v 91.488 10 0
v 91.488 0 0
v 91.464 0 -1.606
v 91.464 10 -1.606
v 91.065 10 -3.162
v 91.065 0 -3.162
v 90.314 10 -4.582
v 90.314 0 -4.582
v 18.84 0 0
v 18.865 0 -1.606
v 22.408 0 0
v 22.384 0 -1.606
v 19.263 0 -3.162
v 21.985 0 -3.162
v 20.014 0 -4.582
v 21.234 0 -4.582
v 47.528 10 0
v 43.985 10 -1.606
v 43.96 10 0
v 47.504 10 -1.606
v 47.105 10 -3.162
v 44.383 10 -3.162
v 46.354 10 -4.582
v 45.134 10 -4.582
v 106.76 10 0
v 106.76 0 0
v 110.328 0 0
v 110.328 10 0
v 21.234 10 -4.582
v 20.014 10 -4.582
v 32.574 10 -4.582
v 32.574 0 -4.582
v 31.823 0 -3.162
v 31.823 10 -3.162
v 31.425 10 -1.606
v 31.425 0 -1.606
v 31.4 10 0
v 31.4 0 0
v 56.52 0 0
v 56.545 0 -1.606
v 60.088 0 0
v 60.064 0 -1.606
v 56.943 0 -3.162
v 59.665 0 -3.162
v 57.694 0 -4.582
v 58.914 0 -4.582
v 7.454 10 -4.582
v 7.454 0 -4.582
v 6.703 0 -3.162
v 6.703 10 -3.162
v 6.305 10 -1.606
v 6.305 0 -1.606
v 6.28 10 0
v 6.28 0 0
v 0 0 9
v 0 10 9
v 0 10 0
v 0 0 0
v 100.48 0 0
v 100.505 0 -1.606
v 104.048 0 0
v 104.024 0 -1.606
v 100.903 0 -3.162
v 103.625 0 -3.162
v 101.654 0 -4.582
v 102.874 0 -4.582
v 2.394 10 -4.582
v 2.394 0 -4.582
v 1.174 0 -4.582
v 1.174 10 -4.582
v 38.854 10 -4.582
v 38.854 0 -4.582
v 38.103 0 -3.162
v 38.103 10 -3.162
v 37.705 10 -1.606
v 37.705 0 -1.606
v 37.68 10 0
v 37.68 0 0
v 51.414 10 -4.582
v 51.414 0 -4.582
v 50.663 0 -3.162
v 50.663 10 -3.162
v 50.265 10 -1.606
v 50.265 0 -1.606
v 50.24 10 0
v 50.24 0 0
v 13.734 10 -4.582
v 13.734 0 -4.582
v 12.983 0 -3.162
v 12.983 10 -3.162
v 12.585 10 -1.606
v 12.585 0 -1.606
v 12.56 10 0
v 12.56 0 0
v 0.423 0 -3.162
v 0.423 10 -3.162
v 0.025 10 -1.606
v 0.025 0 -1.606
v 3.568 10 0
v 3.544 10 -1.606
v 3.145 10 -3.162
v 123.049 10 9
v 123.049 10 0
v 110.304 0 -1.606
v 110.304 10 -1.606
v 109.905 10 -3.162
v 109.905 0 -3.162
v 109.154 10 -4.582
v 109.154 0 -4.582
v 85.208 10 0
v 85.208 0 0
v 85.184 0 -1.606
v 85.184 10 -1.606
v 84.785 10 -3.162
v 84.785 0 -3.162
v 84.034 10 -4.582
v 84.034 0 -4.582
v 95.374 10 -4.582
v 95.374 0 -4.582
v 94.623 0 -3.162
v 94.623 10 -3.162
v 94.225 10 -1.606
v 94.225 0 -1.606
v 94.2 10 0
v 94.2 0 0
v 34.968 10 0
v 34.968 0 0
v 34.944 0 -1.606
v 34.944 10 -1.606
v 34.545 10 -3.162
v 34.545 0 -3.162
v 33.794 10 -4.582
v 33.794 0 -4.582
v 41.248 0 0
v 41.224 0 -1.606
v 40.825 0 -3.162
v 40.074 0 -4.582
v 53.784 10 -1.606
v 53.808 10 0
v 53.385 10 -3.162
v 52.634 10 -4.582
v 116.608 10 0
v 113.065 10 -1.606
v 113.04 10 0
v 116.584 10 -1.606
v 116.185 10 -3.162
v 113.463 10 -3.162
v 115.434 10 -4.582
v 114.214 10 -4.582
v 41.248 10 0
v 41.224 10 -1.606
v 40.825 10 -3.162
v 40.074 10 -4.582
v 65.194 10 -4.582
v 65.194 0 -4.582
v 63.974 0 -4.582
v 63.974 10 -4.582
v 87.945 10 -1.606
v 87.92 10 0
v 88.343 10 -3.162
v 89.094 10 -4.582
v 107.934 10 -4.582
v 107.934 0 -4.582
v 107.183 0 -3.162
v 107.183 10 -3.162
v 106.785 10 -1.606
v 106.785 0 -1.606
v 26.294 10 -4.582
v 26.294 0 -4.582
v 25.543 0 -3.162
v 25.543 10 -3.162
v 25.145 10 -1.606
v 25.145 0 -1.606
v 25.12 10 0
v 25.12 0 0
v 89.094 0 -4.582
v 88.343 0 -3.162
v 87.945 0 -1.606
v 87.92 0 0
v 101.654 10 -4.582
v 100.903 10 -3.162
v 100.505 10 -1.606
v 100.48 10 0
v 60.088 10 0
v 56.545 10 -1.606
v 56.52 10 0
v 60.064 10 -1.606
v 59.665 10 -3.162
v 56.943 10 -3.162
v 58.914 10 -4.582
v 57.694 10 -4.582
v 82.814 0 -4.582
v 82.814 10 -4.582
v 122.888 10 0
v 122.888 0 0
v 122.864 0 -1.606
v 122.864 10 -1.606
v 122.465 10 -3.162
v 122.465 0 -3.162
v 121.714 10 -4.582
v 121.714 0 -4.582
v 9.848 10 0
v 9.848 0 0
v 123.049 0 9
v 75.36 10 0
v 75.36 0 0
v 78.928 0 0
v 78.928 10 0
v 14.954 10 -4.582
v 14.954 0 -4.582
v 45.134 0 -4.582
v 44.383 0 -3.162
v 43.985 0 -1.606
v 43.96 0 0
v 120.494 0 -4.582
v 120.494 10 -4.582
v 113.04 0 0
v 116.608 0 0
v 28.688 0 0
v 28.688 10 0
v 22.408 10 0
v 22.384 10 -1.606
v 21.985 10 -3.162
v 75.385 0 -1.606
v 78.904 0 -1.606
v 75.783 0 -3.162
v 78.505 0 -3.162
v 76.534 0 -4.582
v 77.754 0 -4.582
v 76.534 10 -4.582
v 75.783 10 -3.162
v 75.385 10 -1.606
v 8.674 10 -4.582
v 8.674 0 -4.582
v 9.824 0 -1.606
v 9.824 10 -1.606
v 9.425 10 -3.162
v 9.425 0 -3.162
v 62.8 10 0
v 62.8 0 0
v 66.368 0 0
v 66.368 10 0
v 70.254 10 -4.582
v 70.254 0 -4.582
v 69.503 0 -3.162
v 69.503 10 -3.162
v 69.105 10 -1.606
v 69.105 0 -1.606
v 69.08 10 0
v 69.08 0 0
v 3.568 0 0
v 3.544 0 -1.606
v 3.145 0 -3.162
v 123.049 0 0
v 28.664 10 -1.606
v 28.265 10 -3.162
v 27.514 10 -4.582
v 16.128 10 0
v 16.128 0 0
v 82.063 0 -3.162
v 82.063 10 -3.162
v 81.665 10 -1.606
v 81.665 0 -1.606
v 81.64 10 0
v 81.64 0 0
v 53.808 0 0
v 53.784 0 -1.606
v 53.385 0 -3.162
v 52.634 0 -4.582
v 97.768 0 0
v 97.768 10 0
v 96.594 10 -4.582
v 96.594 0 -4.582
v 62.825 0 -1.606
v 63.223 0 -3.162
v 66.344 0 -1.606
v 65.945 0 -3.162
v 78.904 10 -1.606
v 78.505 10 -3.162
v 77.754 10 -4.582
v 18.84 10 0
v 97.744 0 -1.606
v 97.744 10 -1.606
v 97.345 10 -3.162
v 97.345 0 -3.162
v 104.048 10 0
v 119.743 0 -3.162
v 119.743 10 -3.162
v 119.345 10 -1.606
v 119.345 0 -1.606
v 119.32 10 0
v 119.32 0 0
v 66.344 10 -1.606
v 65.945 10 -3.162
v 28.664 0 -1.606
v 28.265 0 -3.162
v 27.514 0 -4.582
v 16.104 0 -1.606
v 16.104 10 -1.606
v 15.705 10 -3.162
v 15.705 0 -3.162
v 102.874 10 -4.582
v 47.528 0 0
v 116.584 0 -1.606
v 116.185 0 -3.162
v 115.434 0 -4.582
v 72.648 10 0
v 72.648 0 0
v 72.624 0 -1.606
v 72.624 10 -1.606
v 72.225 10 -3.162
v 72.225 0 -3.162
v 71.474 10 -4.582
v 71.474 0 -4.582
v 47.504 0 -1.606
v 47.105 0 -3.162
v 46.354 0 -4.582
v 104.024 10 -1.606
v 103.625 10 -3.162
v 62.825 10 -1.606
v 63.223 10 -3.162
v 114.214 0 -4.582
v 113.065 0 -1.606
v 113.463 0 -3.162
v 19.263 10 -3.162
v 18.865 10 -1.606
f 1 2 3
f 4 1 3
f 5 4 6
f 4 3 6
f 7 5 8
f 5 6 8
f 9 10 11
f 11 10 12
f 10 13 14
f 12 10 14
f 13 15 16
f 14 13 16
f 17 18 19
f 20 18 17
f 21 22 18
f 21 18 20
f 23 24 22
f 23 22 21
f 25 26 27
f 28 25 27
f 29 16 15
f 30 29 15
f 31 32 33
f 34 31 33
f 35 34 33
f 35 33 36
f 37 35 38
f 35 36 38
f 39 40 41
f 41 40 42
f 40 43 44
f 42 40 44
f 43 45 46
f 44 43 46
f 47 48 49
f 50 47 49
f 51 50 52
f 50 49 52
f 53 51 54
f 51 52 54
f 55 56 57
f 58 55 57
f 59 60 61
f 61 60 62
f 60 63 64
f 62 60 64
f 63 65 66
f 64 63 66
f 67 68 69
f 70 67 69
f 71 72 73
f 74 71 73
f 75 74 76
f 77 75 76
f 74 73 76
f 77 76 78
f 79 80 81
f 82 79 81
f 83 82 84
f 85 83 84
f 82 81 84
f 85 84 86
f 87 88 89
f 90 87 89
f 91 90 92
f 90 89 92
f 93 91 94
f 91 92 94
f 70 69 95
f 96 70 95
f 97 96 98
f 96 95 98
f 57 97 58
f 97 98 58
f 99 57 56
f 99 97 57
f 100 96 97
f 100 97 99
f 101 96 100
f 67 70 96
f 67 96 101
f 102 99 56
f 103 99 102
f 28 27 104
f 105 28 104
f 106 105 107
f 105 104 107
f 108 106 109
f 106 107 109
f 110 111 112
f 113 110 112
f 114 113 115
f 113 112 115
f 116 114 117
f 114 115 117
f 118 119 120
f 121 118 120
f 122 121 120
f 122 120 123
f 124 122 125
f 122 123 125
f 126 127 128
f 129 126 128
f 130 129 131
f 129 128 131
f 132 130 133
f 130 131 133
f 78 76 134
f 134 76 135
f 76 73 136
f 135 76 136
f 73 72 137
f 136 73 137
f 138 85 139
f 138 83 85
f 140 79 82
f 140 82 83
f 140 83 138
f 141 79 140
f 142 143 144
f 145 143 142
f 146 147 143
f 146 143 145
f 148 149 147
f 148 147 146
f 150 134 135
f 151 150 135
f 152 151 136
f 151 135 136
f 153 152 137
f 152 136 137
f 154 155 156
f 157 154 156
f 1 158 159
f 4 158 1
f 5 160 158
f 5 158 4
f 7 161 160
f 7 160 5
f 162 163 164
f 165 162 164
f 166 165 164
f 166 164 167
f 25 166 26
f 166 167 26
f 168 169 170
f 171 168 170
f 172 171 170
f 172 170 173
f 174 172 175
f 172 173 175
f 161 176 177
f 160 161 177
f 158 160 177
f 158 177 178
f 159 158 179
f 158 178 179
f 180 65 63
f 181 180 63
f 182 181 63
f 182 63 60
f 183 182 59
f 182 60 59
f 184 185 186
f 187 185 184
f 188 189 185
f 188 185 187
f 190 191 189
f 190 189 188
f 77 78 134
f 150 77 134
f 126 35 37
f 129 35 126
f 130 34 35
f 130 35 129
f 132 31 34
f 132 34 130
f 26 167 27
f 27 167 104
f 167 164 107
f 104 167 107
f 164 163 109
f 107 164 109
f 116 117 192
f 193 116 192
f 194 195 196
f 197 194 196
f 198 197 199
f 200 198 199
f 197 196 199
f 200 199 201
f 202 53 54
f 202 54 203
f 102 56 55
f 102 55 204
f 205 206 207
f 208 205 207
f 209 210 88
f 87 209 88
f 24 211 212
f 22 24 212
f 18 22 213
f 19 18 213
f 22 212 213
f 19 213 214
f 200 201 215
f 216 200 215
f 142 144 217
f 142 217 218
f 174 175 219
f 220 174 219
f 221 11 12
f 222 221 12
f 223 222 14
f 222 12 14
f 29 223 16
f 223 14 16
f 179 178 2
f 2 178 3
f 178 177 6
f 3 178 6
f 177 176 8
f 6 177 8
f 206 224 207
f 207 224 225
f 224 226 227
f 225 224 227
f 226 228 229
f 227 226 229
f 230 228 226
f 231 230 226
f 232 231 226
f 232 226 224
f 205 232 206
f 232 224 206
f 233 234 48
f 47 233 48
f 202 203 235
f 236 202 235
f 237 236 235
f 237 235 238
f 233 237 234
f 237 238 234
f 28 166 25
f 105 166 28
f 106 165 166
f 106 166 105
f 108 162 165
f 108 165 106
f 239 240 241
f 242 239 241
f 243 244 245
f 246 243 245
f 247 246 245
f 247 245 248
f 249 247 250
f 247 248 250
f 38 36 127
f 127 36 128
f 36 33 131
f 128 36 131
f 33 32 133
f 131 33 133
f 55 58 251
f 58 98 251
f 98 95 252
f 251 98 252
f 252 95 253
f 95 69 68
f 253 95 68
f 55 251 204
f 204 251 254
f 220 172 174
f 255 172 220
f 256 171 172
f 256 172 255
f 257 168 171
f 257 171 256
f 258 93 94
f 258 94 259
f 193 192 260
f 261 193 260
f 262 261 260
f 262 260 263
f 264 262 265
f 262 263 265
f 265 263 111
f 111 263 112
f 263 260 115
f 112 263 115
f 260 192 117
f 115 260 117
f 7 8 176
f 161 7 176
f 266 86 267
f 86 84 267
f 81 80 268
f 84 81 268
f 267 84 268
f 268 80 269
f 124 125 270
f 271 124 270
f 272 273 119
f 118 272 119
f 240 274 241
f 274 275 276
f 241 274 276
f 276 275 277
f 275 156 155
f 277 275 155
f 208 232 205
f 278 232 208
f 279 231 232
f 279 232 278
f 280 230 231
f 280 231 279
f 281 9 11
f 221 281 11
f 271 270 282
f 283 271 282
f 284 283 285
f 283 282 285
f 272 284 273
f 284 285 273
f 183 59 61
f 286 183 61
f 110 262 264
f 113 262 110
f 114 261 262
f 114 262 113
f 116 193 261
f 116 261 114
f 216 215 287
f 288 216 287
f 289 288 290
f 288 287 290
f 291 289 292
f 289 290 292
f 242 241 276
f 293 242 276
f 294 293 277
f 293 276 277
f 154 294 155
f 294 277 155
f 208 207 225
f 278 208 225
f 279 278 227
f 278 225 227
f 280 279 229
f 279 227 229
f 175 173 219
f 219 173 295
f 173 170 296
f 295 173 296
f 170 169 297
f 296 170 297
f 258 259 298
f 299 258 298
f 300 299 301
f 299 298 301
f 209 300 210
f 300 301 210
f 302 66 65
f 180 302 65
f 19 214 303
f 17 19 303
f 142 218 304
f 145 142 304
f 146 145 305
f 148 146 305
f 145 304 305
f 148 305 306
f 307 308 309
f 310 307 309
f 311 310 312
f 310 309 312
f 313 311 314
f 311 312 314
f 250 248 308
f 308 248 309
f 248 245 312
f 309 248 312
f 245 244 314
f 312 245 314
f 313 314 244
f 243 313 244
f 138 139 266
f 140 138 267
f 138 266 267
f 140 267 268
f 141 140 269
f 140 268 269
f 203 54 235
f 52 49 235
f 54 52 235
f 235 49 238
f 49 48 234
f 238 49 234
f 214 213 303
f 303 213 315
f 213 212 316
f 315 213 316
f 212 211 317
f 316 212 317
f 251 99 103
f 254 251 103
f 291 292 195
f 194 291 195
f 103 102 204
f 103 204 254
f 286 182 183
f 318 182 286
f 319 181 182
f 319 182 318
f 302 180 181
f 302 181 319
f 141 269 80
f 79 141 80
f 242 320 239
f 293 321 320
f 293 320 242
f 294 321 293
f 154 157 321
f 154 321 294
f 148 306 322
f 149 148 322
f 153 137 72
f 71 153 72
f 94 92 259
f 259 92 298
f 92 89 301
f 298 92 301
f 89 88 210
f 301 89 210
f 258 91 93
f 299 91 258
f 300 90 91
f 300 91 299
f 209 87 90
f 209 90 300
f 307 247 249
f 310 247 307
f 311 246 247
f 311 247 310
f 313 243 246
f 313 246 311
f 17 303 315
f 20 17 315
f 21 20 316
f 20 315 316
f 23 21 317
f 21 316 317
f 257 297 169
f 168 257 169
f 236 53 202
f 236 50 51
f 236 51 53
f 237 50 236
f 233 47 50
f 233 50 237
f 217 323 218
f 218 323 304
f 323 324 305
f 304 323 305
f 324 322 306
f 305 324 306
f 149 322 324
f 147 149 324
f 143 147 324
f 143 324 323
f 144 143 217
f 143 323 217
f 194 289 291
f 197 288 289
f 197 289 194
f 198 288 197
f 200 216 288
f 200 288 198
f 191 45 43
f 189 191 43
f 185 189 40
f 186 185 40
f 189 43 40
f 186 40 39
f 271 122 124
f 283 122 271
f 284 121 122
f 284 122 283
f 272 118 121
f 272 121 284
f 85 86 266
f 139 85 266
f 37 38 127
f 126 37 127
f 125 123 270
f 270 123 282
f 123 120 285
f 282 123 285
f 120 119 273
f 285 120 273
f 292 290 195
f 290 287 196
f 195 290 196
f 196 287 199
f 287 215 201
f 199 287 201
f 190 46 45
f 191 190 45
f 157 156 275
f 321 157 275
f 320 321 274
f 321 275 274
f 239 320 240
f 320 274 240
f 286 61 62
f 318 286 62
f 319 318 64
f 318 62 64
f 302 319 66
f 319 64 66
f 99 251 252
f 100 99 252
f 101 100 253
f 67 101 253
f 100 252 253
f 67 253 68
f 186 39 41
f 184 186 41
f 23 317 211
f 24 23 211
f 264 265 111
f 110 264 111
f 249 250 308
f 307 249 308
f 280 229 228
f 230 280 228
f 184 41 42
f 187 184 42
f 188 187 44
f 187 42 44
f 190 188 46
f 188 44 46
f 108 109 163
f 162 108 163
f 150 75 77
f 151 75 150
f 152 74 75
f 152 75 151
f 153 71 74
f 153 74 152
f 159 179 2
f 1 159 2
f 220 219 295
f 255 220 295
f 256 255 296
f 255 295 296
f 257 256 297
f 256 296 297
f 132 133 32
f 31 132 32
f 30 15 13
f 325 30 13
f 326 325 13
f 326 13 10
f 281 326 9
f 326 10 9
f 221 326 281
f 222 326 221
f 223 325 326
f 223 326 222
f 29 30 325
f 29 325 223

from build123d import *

# Parameters (mm, degrees)
EXTRUDE_1_DEPTH    = 10
EXTRUDE_1_2_DEPTH  = 10
EXTRUDE_1_3_DEPTH  = 10
EXTRUDE_1_4_DEPTH  = 10
EXTRUDE_1_5_DEPTH  = 10
EXTRUDE_1_6_DEPTH  = 10
EXTRUDE_1_7_DEPTH  = 10
EXTRUDE_1_8_DEPTH  = 10
EXTRUDE_1_9_DEPTH  = 10
EXTRUDE_1_10_DEPTH = 10
EXTRUDE_1_11_DEPTH = 10
EXTRUDE_1_12_DEPTH = 10
EXTRUDE_1_13_DEPTH = 10
EXTRUDE_1_14_DEPTH = 10
EXTRUDE_1_15_DEPTH = 10
EXTRUDE_1_16_DEPTH = 10
EXTRUDE_1_17_DEPTH = 10
EXTRUDE_1_18_DEPTH = 10
EXTRUDE_1_19_DEPTH = 10
EXTRUDE_1_20_DEPTH = 10
SKETCH_2_W         = 123.049402761
SKETCH_2_H         = 9
EXTRUDE_2_DEPTH    = 10


with BuildPart() as part:
    # 草图1 → 凸台-拉伸1 (new body)
    with BuildSketch(Plane(origin=(0, 0, 0), x_dir=(1, 0, 0), z_dir=(0, 1, 0))):
        with BuildLine():
            Line((0, 0), (3.56841482, 0))
            ThreePointArc((3.56841482, 0), (3.390081639, 2.395699354), (2.39445741, 4.582))
            Line((2.39445741, 4.582), (1.17395741, 4.582))
            ThreePointArc((1.17395741, 4.582), (0.178333181, 2.395699354), (0, 0))
        make_face()
    extrude(amount=EXTRUDE_1_DEPTH)

    # 草图2 → 凸台-拉伸2 (add)
    with BuildSketch(Plane(origin=(0, 10, 0), x_dir=(1, 0, 0), z_dir=(0, 1, 0))):
        with Locations((61.524701381, -4.5)):
            Rectangle(SKETCH_2_W, SKETCH_2_H)
    extrude(amount=-EXTRUDE_2_DEPTH)


with BuildPart() as body_2:
    # 草图1 → Extrude 1 2 (new body)
    with BuildSketch(Plane(origin=(0, 0, 0), x_dir=(1, 0, 0), z_dir=(0, 1, 0))):
        with BuildLine():
            Line((6.28, 0), (9.84841482, 0))
            ThreePointArc((9.84841482, 0), (9.670081639, 2.395699354), (8.67445741, 4.582))
            Line((8.67445741, 4.582), (7.45395741, 4.582))
            ThreePointArc((7.45395741, 4.582), (6.458333181, 2.395699354), (6.28, 0))
        make_face()
    extrude(amount=EXTRUDE_1_2_DEPTH)


with BuildPart() as body_3:
    # 草图1 → Extrude 1 3 (new body)
    with BuildSketch(Plane(origin=(0, 0, 0), x_dir=(1, 0, 0), z_dir=(0, 1, 0))):
        with BuildLine():
            Line((12.56, 0), (16.12841482, 0))
            ThreePointArc((16.12841482, 0), (15.950081639, 2.395699354), (14.95445741, 4.582))
            Line((14.95445741, 4.582), (13.73395741, 4.582))
            ThreePointArc((13.73395741, 4.582), (12.738333181, 2.395699354), (12.56, 0))
        make_face()
    extrude(amount=EXTRUDE_1_3_DEPTH)


with BuildPart() as body_4:
    # 草图1 → Extrude 1 4 (new body)
    with BuildSketch(Plane(origin=(0, 0, 0), x_dir=(1, 0, 0), z_dir=(0, 1, 0))):
        with BuildLine():
            Line((18.84, 0), (22.40841482, 0))
            ThreePointArc((22.40841482, 0), (22.230081639, 2.395699354), (21.23445741, 4.582))
            Line((21.23445741, 4.582), (20.01395741, 4.582))
            ThreePointArc((20.01395741, 4.582), (19.018333181, 2.395699354), (18.84, 0))
        make_face()
    extrude(amount=EXTRUDE_1_4_DEPTH)


with BuildPart() as body_5:
    # 草图1 → Extrude 1 5 (new body)
    with BuildSketch(Plane(origin=(0, 0, 0), x_dir=(1, 0, 0), z_dir=(0, 1, 0))):
        with BuildLine():
            Line((25.12, 0), (28.68841482, 0))
            ThreePointArc((28.68841482, 0), (28.510081639, 2.395699354), (27.51445741, 4.582))
            Line((27.51445741, 4.582), (26.29395741, 4.582))
            ThreePointArc((26.29395741, 4.582), (25.298333181, 2.395699354), (25.12, 0))
        make_face()
    extrude(amount=EXTRUDE_1_5_DEPTH)


with BuildPart() as body_6:
    # 草图1 → Extrude 1 6 (new body)
    with BuildSketch(Plane(origin=(0, 0, 0), x_dir=(1, 0, 0), z_dir=(0, 1, 0))):
        with BuildLine():
            Line((31.4, 0), (34.96841482, 0))
            ThreePointArc((34.96841482, 0), (34.790081639, 2.395699354), (33.79445741, 4.582))
            Line((33.79445741, 4.582), (32.57395741, 4.582))
            ThreePointArc((32.57395741, 4.582), (31.578333181, 2.395699354), (31.4, 0))
        make_face()
    extrude(amount=EXTRUDE_1_6_DEPTH)


with BuildPart() as body_7:
    # 草图1 → Extrude 1 7 (new body)
    with BuildSketch(Plane(origin=(0, 0, 0), x_dir=(1, 0, 0), z_dir=(0, 1, 0))):
        with BuildLine():
            Line((37.68, 0), (41.24841482, 0))
            ThreePointArc((41.24841482, 0), (41.070081639, 2.395699354), (40.07445741, 4.582))
            Line((40.07445741, 4.582), (38.85395741, 4.582))
            ThreePointArc((38.85395741, 4.582), (37.858333181, 2.395699354), (37.68, 0))
        make_face()
    extrude(amount=EXTRUDE_1_7_DEPTH)


with BuildPart() as body_8:
    # 草图1 → Extrude 1 8 (new body)
    with BuildSketch(Plane(origin=(0, 0, 0), x_dir=(1, 0, 0), z_dir=(0, 1, 0))):
        with BuildLine():
            Line((43.96, 0), (47.52841482, 0))
            ThreePointArc((47.52841482, 0), (47.350081639, 2.395699354), (46.35445741, 4.582))
            Line((46.35445741, 4.582), (45.13395741, 4.582))
            ThreePointArc((45.13395741, 4.582), (44.138333181, 2.395699354), (43.96, 0))
        make_face()
    extrude(amount=EXTRUDE_1_8_DEPTH)


with BuildPart() as body_9:
    # 草图1 → Extrude 1 9 (new body)
    with BuildSketch(Plane(origin=(0, 0, 0), x_dir=(1, 0, 0), z_dir=(0, 1, 0))):
        with BuildLine():
            Line((50.24, 0), (53.80841482, 0))
            ThreePointArc((53.80841482, 0), (53.630081639, 2.395699354), (52.63445741, 4.582))
            Line((52.63445741, 4.582), (51.41395741, 4.582))
            ThreePointArc((51.41395741, 4.582), (50.418333181, 2.395699354), (50.24, 0))
        make_face()
    extrude(amount=EXTRUDE_1_9_DEPTH)


with BuildPart() as body_10:
    # 草图1 → Extrude 1 10 (new body)
    with BuildSketch(Plane(origin=(0, 0, 0), x_dir=(1, 0, 0), z_dir=(0, 1, 0))):
        with BuildLine():
            Line((56.52, 0), (60.08841482, 0))
            ThreePointArc((60.08841482, 0), (59.910081639, 2.395699354), (58.91445741, 4.582))
            Line((58.91445741, 4.582), (57.69395741, 4.582))
            ThreePointArc((57.69395741, 4.582), (56.698333181, 2.395699354), (56.52, 0))
        make_face()
    extrude(amount=EXTRUDE_1_10_DEPTH)


with BuildPart() as body_11:
    # 草图1 → Extrude 1 11 (new body)
    with BuildSketch(Plane(origin=(0, 0, 0), x_dir=(1, 0, 0), z_dir=(0, 1, 0))):
        with BuildLine():
            Line((62.8, 0), (66.36841482, 0))
            ThreePointArc((66.36841482, 0), (66.190081639, 2.395699354), (65.19445741, 4.582))
            Line((65.19445741, 4.582), (63.97395741, 4.582))
            ThreePointArc((63.97395741, 4.582), (62.978333181, 2.395699354), (62.8, 0))
        make_face()
    extrude(amount=EXTRUDE_1_11_DEPTH)


with BuildPart() as body_12:
    # 草图1 → Extrude 1 12 (new body)
    with BuildSketch(Plane(origin=(0, 0, 0), x_dir=(1, 0, 0), z_dir=(0, 1, 0))):
        with BuildLine():
            Line((69.08, 0), (72.64841482, 0))
            ThreePointArc((72.64841482, 0), (72.470081639, 2.395699354), (71.47445741, 4.582))
            Line((71.47445741, 4.582), (70.25395741, 4.582))
            ThreePointArc((70.25395741, 4.582), (69.258333181, 2.395699354), (69.08, 0))
        make_face()
    extrude(amount=EXTRUDE_1_12_DEPTH)


with BuildPart() as body_13:
    # 草图1 → Extrude 1 13 (new body)
    with BuildSketch(Plane(origin=(0, 0, 0), x_dir=(1, 0, 0), z_dir=(0, 1, 0))):
        with BuildLine():
            Line((75.36, 0), (78.92841482, 0))
            ThreePointArc((78.92841482, 0), (78.750081639, 2.395699354), (77.75445741, 4.582))
            Line((77.75445741, 4.582), (76.53395741, 4.582))
            ThreePointArc((76.53395741, 4.582), (75.538333181, 2.395699354), (75.36, 0))
        make_face()
    extrude(amount=EXTRUDE_1_13_DEPTH)


with BuildPart() as body_14:
    # 草图1 → Extrude 1 14 (new body)
    with BuildSketch(Plane(origin=(0, 0, 0), x_dir=(1, 0, 0), z_dir=(0, 1, 0))):
        with BuildLine():
            Line((81.64, 0), (85.20841482, 0))
            ThreePointArc((85.20841482, 0), (85.030081639, 2.395699354), (84.03445741, 4.582))
            Line((84.03445741, 4.582), (82.81395741, 4.582))
            ThreePointArc((82.81395741, 4.582), (81.818333181, 2.395699354), (81.64, 0))
        make_face()
    extrude(amount=EXTRUDE_1_14_DEPTH)


with BuildPart() as body_15:
    # 草图1 → Extrude 1 15 (new body)
    with BuildSketch(Plane(origin=(0, 0, 0), x_dir=(1, 0, 0), z_dir=(0, 1, 0))):
        with BuildLine():
            Line((87.92, 0), (91.48841482, 0))
            ThreePointArc((91.48841482, 0), (91.310081639, 2.395699354), (90.31445741, 4.582))
            Line((90.31445741, 4.582), (89.09395741, 4.582))
            ThreePointArc((89.09395741, 4.582), (88.098333181, 2.395699354), (87.92, 0))
        make_face()
    extrude(amount=EXTRUDE_1_15_DEPTH)


with BuildPart() as body_16:
    # 草图1 → Extrude 1 16 (new body)
    with BuildSketch(Plane(origin=(0, 0, 0), x_dir=(1, 0, 0), z_dir=(0, 1, 0))):
        with BuildLine():
            Line((94.2, 0), (97.76841482, 0))
            ThreePointArc((97.76841482, 0), (97.590081639, 2.395699354), (96.59445741, 4.582))
            Line((96.59445741, 4.582), (95.37395741, 4.582))
            ThreePointArc((95.37395741, 4.582), (94.378333181, 2.395699354), (94.2, 0))
        make_face()
    extrude(amount=EXTRUDE_1_16_DEPTH)


with BuildPart() as body_17:
    # 草图1 → Extrude 1 17 (new body)
    with BuildSketch(Plane(origin=(0, 0, 0), x_dir=(1, 0, 0), z_dir=(0, 1, 0))):
        with BuildLine():
            Line((100.48, 0), (104.04841482, 0))
            ThreePointArc((104.04841482, 0), (103.870081639, 2.395699354), (102.87445741, 4.582))
            Line((102.87445741, 4.582), (101.65395741, 4.582))
            ThreePointArc((101.65395741, 4.582), (100.658333181, 2.395699354), (100.48, 0))
        make_face()
    extrude(amount=EXTRUDE_1_17_DEPTH)


with BuildPart() as body_18:
    # 草图1 → Extrude 1 18 (new body)
    with BuildSketch(Plane(origin=(0, 0, 0), x_dir=(1, 0, 0), z_dir=(0, 1, 0))):
        with BuildLine():
            Line((106.76, 0), (110.32841482, 0))
            ThreePointArc((110.32841482, 0), (110.150081639, 2.395699354), (109.15445741, 4.582))
            Line((109.15445741, 4.582), (107.93395741, 4.582))
            ThreePointArc((107.93395741, 4.582), (106.938333181, 2.395699354), (106.76, 0))
        make_face()
    extrude(amount=EXTRUDE_1_18_DEPTH)


with BuildPart() as body_19:
    # 草图1 → Extrude 1 19 (new body)
    with BuildSketch(Plane(origin=(0, 0, 0), x_dir=(1, 0, 0), z_dir=(0, 1, 0))):
        with BuildLine():
            Line((113.04, 0), (116.60841482, 0))
            ThreePointArc((116.60841482, 0), (116.430081639, 2.395699354), (115.43445741, 4.582))
            Line((115.43445741, 4.582), (114.21395741, 4.582))
            ThreePointArc((114.21395741, 4.582), (113.218333181, 2.395699354), (113.04, 0))
        make_face()
    extrude(amount=EXTRUDE_1_19_DEPTH)


with BuildPart() as body_20:
    # 草图1 → Extrude 1 20 (new body)
    with BuildSketch(Plane(origin=(0, 0, 0), x_dir=(1, 0, 0), z_dir=(0, 1, 0))):
        with BuildLine():
            Line((119.32, 0), (122.88841482, 0))
            ThreePointArc((122.88841482, 0), (122.710081639, 2.395699354), (121.71445741, 4.582))
            Line((121.71445741, 4.582), (120.49395741, 4.582))
            ThreePointArc((120.49395741, 4.582), (119.498333181, 2.395699354), (119.32, 0))
        make_face()
    extrude(amount=EXTRUDE_1_20_DEPTH)


solid = Compound([part.part, body_2.part, body_3.part, body_4.part, body_5.part, body_6.part, body_7.part, body_8.part, body_9.part, body_10.part, body_11.part, body_12.part, body_13.part, body_14.part, body_15.part, body_16.part, body_17.part, body_18.part, body_19.part, body_20.part])
